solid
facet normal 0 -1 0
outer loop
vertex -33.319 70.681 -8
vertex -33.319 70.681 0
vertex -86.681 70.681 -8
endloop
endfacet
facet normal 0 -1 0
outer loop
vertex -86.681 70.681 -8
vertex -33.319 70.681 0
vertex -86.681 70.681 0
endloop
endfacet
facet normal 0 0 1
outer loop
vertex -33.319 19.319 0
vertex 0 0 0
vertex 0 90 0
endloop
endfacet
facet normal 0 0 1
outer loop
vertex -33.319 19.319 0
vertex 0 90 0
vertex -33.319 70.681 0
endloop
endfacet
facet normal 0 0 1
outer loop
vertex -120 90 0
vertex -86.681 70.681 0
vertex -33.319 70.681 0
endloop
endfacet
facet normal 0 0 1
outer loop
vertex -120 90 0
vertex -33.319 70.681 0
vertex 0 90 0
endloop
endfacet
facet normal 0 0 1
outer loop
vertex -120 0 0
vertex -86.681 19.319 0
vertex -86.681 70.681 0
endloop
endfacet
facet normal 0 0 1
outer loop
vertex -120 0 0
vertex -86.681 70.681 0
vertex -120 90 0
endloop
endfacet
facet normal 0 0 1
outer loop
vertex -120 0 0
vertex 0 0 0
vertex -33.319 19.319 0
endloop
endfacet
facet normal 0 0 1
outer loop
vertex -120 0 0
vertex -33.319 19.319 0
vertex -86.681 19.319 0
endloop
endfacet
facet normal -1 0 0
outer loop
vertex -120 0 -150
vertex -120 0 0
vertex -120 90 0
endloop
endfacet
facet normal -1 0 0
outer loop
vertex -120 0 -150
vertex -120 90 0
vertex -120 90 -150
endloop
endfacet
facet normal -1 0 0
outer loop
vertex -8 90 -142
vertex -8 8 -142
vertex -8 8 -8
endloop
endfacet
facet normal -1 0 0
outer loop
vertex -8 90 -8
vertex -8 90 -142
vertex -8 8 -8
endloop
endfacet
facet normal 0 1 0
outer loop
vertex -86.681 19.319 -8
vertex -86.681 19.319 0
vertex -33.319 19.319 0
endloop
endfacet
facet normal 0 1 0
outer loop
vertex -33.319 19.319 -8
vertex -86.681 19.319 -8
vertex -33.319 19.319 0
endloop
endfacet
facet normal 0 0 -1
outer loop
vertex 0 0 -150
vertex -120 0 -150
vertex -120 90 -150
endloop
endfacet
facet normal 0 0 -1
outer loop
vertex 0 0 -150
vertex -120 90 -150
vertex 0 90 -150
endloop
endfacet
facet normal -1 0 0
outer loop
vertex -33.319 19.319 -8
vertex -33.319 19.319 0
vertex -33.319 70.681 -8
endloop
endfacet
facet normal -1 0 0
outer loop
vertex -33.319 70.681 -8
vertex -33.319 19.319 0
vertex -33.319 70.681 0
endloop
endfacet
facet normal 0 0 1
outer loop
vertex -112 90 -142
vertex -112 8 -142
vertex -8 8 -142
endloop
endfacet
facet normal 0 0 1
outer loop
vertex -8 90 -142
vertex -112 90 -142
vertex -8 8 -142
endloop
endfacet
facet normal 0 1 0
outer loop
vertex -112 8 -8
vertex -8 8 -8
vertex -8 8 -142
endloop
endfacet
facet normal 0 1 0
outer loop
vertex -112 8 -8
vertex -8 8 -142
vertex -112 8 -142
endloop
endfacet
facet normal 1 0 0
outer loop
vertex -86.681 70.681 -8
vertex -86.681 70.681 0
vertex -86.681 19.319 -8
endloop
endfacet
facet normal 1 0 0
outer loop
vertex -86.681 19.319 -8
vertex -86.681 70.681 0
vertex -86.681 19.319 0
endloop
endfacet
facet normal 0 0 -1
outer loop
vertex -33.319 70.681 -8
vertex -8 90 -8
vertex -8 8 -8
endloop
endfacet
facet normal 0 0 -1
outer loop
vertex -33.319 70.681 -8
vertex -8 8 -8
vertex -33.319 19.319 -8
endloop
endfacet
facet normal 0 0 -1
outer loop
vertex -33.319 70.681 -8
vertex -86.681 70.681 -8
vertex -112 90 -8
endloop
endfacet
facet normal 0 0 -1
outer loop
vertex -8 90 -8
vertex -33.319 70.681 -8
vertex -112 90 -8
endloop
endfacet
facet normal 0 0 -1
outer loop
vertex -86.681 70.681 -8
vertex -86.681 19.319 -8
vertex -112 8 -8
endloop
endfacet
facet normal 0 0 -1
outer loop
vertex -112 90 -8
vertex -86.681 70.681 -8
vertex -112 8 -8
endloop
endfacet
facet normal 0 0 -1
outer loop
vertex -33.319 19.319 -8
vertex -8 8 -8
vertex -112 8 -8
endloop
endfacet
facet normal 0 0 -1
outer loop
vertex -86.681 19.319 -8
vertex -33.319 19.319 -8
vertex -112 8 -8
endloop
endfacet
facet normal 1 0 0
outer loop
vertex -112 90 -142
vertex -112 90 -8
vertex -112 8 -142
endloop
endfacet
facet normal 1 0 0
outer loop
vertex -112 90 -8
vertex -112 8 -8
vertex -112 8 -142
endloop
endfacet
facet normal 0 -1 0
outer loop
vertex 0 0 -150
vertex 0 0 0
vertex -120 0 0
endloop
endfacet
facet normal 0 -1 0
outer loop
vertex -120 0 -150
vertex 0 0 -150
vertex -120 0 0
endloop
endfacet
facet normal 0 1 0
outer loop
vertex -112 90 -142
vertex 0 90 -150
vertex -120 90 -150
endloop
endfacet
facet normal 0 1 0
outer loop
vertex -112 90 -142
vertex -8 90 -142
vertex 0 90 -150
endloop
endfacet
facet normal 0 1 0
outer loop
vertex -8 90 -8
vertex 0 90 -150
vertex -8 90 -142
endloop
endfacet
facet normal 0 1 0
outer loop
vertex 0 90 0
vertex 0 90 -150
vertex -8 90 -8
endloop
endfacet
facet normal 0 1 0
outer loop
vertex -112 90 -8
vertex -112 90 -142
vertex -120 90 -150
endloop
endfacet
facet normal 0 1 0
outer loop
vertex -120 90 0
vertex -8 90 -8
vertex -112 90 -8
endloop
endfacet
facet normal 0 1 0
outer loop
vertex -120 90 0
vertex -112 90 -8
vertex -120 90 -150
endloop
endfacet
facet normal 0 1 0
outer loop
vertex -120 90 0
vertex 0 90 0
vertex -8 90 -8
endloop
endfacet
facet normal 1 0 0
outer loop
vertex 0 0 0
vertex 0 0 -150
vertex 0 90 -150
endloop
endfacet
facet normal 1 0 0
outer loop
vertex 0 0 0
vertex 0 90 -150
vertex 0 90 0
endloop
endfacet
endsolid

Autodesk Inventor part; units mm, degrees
ref_plane "YZ Plane" through (0, 0, 0) normal (1, 0, 0) x (0, 1, 0)
ref_plane "XZ Plane" through (0, 0, 0) normal (0, 1, 0) x (-1, 0, 0)
ref_plane "XY Plane" through (0, 0, 0) normal (0, 0, 1) x (1, 0, 0)
sketch "Sketch1" plane through (0, 0, 0) normal (0, 1, 0) x (-1, 0, 0)
  line L0 (0, 0) -> (120, 0)
  line L1 (120, 0) -> (120, -150)
  line L2 (120, -150) -> (0, -150)
  line L3 (0, -150) -> (0, 0)
  dimension "d0" = 120
  dimension "d1" = 150
extrude "Extrusion1" add sketch "Sketch1" along normal blind 90
shell "Shell1" thickness 8 removed faces 1 at (-80, 90, -100)
sketch "Sketch2" plane through (-120, 0, 0) normal (0, 0, 1) x (1, 0, 0)
  line L0 (120, 0) -> (0, 0) projected
  line L1 (0, 0) -> (0, 90) projected
  line L2 (86.681, 70.681) -> (33.319, 70.681)
  line L3 (33.319, 70.681) -> (33.319, 19.319)
  line L4 (33.319, 19.319) -> (86.681, 19.319)
  line L5 (86.681, 19.319) -> (86.681, 70.681)
  line L6 (86.681, 70.681) -> (33.319, 19.319) construction
  line L7 (33.319, 70.681) -> (86.681, 19.319) construction
  dimension "d5" = 53.362
  dimension "d6" = 51.362
extrude "Extrusion2" cut sketch "Sketch2" against normal blind 80
properties part number "case"
